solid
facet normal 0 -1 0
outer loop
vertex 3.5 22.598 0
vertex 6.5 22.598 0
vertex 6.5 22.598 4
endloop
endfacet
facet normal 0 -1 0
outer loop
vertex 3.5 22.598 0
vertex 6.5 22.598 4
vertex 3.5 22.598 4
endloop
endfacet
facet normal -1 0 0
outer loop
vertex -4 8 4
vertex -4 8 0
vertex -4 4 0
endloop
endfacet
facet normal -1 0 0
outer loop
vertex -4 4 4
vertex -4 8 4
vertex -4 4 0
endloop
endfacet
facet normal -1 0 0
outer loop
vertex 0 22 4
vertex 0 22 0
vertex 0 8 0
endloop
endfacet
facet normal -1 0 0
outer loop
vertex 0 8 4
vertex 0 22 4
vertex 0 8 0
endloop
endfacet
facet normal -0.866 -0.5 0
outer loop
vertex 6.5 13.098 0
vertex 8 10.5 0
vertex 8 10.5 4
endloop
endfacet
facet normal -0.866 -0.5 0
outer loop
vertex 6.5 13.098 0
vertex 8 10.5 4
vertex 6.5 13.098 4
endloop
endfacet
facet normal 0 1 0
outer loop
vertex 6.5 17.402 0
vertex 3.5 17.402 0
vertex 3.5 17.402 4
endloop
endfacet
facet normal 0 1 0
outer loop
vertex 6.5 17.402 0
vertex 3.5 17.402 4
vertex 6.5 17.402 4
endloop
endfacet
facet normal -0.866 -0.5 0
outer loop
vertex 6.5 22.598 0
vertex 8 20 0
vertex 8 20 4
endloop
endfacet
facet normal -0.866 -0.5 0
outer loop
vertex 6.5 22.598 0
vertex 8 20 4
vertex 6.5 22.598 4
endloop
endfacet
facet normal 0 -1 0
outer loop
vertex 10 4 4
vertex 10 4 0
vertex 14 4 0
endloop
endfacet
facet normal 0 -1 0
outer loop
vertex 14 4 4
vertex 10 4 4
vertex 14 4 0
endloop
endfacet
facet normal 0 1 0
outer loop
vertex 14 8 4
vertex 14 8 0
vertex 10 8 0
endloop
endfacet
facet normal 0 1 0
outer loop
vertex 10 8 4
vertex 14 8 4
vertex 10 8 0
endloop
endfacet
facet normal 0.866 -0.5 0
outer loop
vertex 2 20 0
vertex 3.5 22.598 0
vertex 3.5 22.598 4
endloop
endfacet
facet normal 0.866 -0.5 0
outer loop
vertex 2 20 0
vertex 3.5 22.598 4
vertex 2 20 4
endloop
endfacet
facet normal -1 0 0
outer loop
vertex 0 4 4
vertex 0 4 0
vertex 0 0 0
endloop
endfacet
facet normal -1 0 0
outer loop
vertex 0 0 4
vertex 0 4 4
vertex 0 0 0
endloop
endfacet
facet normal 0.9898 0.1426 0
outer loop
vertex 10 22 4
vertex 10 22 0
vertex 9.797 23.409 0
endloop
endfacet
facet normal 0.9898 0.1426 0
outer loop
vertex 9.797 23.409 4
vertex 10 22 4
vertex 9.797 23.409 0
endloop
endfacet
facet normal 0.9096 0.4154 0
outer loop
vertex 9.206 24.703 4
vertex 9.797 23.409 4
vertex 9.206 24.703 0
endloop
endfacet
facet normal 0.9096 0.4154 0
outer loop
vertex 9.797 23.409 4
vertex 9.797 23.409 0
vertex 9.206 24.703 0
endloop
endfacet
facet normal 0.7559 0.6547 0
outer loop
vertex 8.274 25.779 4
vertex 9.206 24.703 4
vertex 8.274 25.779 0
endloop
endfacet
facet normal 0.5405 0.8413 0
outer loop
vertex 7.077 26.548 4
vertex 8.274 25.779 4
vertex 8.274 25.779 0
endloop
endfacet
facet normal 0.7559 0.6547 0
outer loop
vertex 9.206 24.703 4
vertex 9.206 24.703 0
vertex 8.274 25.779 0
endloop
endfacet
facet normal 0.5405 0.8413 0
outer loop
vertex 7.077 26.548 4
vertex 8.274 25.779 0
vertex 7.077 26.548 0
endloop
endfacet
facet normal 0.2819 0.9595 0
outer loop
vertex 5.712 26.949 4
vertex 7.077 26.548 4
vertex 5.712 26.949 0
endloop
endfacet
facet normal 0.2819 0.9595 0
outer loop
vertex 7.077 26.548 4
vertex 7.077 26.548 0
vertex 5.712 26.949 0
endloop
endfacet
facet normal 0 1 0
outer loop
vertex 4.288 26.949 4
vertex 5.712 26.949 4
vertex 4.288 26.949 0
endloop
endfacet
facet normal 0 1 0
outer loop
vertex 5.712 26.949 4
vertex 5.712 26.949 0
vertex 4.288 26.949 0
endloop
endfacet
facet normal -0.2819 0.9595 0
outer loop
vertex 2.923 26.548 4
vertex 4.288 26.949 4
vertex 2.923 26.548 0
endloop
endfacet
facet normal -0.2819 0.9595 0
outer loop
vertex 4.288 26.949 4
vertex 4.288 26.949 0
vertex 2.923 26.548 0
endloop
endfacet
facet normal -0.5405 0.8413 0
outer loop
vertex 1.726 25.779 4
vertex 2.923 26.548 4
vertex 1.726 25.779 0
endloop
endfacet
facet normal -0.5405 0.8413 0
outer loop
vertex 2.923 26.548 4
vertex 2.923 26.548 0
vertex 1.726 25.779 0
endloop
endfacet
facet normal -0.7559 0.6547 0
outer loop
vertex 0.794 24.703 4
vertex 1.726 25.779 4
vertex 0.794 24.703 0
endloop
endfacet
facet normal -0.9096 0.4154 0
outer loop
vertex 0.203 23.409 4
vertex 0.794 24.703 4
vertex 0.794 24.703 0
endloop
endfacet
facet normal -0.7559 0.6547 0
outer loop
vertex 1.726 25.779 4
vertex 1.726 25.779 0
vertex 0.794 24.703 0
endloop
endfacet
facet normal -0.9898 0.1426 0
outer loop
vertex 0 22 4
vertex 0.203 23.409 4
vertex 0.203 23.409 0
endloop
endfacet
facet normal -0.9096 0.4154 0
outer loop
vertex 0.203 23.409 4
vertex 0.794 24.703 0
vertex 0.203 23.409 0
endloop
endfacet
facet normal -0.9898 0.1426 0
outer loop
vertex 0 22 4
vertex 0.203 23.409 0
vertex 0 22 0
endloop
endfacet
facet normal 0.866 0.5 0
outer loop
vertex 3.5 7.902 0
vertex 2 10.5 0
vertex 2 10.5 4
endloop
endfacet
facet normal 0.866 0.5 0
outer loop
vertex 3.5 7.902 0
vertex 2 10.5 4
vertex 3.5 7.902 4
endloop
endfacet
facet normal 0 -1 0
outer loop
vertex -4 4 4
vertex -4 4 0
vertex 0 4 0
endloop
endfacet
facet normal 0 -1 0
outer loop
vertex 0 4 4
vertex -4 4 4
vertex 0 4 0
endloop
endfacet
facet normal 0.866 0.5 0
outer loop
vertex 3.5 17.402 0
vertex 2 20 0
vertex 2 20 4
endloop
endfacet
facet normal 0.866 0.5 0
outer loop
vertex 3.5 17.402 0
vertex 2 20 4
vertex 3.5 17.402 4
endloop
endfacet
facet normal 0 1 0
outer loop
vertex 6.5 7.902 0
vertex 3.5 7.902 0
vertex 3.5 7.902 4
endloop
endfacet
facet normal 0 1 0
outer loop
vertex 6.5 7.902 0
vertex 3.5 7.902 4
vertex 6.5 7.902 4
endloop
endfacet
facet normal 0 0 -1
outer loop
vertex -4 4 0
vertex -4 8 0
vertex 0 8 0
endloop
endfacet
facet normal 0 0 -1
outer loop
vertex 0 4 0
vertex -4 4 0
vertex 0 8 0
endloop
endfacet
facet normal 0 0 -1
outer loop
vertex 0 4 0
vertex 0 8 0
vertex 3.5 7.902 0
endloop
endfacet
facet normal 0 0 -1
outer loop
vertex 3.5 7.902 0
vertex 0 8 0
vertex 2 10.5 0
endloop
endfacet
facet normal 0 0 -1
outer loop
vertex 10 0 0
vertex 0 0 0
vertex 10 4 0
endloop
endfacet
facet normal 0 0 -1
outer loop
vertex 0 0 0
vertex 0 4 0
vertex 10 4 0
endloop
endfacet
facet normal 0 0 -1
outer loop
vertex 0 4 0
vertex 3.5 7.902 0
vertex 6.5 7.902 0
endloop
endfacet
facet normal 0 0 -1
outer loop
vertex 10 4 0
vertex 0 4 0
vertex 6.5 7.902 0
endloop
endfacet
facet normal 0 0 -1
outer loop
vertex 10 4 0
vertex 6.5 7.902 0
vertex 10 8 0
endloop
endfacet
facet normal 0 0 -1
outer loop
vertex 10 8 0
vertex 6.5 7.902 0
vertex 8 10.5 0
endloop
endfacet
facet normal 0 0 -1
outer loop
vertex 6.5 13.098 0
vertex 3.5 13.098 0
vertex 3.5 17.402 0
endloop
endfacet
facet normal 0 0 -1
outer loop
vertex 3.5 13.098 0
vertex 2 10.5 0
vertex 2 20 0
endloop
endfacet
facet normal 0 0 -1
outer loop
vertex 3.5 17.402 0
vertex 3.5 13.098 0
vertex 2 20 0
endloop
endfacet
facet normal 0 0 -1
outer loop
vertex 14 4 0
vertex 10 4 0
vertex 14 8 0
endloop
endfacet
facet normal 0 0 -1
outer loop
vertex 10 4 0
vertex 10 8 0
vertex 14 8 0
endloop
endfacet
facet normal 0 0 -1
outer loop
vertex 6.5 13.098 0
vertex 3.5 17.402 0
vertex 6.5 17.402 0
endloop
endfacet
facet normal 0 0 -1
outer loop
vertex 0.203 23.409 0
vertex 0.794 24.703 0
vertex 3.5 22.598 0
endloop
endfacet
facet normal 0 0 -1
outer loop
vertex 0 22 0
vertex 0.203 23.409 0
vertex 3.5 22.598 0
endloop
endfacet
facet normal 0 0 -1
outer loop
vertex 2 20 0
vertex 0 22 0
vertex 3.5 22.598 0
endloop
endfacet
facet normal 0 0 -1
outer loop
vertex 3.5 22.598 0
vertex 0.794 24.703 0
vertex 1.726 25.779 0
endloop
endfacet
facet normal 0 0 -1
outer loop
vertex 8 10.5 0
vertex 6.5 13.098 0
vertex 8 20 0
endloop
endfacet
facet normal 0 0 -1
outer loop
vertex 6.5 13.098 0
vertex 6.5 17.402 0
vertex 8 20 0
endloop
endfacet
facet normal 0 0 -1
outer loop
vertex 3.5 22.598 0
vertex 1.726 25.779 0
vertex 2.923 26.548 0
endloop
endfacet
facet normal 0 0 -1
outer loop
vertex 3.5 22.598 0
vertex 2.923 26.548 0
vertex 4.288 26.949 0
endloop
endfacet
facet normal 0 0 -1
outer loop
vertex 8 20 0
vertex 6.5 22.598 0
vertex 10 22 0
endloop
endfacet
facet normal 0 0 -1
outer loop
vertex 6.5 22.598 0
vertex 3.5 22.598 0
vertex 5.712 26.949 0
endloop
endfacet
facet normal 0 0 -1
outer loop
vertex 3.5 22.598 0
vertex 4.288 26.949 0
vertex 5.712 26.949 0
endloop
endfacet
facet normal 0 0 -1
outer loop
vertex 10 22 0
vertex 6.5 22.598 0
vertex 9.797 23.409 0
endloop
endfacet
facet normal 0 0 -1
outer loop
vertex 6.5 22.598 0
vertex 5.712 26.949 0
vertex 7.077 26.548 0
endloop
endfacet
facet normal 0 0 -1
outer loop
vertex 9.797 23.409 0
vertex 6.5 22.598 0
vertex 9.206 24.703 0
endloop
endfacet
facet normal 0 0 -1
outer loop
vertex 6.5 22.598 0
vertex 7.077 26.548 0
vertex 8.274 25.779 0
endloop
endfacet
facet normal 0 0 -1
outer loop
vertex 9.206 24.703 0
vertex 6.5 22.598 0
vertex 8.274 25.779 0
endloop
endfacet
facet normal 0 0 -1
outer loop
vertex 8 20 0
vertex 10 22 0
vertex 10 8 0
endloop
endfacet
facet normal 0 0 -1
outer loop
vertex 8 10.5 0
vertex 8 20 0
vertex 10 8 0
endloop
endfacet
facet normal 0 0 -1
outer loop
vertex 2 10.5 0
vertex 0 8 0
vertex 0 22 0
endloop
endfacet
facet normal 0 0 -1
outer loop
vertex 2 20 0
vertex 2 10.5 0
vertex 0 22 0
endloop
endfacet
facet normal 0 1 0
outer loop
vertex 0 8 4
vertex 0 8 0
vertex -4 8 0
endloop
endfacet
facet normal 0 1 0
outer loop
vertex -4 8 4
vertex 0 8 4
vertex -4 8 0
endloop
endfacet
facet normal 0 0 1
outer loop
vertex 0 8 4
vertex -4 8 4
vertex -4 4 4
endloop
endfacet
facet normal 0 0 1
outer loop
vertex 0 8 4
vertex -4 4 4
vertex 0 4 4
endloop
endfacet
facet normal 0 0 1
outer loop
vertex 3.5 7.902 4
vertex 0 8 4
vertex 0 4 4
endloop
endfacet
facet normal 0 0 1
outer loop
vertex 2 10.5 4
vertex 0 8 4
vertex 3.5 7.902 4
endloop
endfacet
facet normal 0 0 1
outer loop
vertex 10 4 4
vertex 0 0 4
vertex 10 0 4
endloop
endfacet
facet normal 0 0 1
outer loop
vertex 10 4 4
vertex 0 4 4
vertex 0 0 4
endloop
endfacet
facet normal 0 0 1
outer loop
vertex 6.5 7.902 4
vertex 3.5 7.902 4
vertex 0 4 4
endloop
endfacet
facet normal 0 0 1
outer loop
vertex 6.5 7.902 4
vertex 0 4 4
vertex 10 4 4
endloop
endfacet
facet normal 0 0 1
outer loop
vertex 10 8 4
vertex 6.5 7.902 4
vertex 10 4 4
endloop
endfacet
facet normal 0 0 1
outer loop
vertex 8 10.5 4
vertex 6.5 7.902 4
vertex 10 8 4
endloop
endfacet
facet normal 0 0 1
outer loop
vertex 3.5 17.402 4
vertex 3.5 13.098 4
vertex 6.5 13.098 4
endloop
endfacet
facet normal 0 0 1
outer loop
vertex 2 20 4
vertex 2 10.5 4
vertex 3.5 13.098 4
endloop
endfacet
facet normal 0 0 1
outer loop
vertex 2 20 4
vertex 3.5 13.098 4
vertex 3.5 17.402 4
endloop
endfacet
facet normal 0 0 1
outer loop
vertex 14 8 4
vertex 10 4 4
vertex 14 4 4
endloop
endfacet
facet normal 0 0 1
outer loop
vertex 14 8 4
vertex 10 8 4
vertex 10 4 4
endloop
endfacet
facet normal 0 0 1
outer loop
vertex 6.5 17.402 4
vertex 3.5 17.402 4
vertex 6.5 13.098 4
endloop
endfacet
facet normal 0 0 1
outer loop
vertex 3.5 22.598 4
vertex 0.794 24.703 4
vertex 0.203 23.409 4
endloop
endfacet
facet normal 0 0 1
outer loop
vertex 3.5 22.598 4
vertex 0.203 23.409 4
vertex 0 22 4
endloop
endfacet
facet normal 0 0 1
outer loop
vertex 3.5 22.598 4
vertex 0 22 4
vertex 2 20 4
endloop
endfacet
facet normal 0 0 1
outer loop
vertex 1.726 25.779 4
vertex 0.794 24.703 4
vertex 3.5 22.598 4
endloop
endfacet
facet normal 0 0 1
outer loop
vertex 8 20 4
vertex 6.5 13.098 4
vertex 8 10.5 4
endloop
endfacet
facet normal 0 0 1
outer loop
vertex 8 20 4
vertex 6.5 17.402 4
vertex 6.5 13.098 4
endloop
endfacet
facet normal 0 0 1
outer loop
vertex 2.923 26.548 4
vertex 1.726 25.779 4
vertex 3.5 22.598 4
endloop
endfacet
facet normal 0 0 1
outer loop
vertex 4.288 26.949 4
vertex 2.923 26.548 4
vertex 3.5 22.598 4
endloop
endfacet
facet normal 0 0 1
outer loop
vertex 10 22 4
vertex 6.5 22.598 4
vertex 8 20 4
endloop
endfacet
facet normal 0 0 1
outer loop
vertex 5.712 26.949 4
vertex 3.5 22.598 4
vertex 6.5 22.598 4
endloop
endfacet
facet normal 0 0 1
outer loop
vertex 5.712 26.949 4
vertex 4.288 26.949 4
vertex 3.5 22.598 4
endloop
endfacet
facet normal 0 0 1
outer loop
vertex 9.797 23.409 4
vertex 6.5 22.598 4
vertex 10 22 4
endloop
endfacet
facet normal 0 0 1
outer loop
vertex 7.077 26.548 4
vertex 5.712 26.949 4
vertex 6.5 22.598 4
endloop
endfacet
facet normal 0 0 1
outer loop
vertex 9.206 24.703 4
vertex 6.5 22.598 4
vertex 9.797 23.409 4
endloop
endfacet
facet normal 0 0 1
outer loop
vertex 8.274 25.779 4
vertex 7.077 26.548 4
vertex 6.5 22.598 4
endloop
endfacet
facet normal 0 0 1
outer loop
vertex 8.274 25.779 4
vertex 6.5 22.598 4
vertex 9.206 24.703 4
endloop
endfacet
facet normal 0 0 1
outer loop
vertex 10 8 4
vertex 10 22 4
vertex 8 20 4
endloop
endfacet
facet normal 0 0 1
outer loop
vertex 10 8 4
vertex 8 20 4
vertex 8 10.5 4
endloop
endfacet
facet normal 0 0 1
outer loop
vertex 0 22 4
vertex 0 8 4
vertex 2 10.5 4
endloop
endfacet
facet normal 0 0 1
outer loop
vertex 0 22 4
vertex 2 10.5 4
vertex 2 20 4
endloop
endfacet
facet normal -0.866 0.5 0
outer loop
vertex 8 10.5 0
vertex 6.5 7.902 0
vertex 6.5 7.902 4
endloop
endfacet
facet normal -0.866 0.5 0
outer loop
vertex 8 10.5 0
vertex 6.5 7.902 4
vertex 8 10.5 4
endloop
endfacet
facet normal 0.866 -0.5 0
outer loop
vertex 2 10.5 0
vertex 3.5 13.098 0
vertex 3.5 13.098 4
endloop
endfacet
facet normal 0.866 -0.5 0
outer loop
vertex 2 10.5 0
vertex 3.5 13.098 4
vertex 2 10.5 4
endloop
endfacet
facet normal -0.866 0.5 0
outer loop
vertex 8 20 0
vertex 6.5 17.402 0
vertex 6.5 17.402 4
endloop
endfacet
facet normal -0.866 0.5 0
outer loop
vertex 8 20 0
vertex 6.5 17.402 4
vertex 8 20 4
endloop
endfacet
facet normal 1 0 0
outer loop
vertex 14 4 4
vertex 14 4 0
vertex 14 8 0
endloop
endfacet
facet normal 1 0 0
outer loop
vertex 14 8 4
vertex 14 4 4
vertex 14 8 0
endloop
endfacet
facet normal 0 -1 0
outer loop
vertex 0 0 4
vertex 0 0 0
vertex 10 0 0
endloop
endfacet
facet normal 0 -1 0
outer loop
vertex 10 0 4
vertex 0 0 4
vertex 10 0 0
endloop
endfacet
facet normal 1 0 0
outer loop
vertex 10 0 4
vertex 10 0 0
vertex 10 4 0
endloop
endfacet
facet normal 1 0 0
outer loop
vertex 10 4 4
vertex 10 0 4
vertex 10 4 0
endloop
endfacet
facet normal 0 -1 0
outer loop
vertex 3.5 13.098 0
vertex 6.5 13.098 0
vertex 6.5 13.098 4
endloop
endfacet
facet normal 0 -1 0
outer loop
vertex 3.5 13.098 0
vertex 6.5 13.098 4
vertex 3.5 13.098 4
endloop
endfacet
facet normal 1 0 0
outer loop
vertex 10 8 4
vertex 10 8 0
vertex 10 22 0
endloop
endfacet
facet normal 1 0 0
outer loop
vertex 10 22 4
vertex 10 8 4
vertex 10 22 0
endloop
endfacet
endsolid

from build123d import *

# Parameters (mm, degrees)
BOSS_EXTRUDE1_DEPTH = 4


with BuildPart() as part:
    # Sketch1 → Boss-Extrude1 (new body)
    with BuildSketch(Plane.XY):
        with BuildLine():
            Line((0, 0), (10, 0))
            Line((10, 0), (10, 4))
            Line((10, 4), (14, 4))
            Line((14, 4), (14, 8))
            Line((14, 8), (10, 8))
            Line((10, 8), (10, 22))
            ThreePointArc((10, 22), (5, 27), (0, 22))
            Line((0, 22), (0, 8))
            Line((0, 8), (-4, 8))
            Line((-4, 8), (-4, 4))
            Line((-4, 4), (0, 4))
            Line((0, 4), (0, 0))
        make_face()
        Polygon((3.5, 17.401923789), (6.5, 17.401923789), (8, 20), (6.5, 22.598076211), (3.5, 22.598076211), (2, 20), align=None, mode=Mode.SUBTRACT)
        Polygon((8, 10.5), (6.5, 13.098076211), (3.5, 13.098076211), (2, 10.5), (3.5, 7.901923789), (6.5, 7.901923789), align=None, mode=Mode.SUBTRACT)
    extrude(amount=BOSS_EXTRUDE1_DEPTH)


solid = part.part
